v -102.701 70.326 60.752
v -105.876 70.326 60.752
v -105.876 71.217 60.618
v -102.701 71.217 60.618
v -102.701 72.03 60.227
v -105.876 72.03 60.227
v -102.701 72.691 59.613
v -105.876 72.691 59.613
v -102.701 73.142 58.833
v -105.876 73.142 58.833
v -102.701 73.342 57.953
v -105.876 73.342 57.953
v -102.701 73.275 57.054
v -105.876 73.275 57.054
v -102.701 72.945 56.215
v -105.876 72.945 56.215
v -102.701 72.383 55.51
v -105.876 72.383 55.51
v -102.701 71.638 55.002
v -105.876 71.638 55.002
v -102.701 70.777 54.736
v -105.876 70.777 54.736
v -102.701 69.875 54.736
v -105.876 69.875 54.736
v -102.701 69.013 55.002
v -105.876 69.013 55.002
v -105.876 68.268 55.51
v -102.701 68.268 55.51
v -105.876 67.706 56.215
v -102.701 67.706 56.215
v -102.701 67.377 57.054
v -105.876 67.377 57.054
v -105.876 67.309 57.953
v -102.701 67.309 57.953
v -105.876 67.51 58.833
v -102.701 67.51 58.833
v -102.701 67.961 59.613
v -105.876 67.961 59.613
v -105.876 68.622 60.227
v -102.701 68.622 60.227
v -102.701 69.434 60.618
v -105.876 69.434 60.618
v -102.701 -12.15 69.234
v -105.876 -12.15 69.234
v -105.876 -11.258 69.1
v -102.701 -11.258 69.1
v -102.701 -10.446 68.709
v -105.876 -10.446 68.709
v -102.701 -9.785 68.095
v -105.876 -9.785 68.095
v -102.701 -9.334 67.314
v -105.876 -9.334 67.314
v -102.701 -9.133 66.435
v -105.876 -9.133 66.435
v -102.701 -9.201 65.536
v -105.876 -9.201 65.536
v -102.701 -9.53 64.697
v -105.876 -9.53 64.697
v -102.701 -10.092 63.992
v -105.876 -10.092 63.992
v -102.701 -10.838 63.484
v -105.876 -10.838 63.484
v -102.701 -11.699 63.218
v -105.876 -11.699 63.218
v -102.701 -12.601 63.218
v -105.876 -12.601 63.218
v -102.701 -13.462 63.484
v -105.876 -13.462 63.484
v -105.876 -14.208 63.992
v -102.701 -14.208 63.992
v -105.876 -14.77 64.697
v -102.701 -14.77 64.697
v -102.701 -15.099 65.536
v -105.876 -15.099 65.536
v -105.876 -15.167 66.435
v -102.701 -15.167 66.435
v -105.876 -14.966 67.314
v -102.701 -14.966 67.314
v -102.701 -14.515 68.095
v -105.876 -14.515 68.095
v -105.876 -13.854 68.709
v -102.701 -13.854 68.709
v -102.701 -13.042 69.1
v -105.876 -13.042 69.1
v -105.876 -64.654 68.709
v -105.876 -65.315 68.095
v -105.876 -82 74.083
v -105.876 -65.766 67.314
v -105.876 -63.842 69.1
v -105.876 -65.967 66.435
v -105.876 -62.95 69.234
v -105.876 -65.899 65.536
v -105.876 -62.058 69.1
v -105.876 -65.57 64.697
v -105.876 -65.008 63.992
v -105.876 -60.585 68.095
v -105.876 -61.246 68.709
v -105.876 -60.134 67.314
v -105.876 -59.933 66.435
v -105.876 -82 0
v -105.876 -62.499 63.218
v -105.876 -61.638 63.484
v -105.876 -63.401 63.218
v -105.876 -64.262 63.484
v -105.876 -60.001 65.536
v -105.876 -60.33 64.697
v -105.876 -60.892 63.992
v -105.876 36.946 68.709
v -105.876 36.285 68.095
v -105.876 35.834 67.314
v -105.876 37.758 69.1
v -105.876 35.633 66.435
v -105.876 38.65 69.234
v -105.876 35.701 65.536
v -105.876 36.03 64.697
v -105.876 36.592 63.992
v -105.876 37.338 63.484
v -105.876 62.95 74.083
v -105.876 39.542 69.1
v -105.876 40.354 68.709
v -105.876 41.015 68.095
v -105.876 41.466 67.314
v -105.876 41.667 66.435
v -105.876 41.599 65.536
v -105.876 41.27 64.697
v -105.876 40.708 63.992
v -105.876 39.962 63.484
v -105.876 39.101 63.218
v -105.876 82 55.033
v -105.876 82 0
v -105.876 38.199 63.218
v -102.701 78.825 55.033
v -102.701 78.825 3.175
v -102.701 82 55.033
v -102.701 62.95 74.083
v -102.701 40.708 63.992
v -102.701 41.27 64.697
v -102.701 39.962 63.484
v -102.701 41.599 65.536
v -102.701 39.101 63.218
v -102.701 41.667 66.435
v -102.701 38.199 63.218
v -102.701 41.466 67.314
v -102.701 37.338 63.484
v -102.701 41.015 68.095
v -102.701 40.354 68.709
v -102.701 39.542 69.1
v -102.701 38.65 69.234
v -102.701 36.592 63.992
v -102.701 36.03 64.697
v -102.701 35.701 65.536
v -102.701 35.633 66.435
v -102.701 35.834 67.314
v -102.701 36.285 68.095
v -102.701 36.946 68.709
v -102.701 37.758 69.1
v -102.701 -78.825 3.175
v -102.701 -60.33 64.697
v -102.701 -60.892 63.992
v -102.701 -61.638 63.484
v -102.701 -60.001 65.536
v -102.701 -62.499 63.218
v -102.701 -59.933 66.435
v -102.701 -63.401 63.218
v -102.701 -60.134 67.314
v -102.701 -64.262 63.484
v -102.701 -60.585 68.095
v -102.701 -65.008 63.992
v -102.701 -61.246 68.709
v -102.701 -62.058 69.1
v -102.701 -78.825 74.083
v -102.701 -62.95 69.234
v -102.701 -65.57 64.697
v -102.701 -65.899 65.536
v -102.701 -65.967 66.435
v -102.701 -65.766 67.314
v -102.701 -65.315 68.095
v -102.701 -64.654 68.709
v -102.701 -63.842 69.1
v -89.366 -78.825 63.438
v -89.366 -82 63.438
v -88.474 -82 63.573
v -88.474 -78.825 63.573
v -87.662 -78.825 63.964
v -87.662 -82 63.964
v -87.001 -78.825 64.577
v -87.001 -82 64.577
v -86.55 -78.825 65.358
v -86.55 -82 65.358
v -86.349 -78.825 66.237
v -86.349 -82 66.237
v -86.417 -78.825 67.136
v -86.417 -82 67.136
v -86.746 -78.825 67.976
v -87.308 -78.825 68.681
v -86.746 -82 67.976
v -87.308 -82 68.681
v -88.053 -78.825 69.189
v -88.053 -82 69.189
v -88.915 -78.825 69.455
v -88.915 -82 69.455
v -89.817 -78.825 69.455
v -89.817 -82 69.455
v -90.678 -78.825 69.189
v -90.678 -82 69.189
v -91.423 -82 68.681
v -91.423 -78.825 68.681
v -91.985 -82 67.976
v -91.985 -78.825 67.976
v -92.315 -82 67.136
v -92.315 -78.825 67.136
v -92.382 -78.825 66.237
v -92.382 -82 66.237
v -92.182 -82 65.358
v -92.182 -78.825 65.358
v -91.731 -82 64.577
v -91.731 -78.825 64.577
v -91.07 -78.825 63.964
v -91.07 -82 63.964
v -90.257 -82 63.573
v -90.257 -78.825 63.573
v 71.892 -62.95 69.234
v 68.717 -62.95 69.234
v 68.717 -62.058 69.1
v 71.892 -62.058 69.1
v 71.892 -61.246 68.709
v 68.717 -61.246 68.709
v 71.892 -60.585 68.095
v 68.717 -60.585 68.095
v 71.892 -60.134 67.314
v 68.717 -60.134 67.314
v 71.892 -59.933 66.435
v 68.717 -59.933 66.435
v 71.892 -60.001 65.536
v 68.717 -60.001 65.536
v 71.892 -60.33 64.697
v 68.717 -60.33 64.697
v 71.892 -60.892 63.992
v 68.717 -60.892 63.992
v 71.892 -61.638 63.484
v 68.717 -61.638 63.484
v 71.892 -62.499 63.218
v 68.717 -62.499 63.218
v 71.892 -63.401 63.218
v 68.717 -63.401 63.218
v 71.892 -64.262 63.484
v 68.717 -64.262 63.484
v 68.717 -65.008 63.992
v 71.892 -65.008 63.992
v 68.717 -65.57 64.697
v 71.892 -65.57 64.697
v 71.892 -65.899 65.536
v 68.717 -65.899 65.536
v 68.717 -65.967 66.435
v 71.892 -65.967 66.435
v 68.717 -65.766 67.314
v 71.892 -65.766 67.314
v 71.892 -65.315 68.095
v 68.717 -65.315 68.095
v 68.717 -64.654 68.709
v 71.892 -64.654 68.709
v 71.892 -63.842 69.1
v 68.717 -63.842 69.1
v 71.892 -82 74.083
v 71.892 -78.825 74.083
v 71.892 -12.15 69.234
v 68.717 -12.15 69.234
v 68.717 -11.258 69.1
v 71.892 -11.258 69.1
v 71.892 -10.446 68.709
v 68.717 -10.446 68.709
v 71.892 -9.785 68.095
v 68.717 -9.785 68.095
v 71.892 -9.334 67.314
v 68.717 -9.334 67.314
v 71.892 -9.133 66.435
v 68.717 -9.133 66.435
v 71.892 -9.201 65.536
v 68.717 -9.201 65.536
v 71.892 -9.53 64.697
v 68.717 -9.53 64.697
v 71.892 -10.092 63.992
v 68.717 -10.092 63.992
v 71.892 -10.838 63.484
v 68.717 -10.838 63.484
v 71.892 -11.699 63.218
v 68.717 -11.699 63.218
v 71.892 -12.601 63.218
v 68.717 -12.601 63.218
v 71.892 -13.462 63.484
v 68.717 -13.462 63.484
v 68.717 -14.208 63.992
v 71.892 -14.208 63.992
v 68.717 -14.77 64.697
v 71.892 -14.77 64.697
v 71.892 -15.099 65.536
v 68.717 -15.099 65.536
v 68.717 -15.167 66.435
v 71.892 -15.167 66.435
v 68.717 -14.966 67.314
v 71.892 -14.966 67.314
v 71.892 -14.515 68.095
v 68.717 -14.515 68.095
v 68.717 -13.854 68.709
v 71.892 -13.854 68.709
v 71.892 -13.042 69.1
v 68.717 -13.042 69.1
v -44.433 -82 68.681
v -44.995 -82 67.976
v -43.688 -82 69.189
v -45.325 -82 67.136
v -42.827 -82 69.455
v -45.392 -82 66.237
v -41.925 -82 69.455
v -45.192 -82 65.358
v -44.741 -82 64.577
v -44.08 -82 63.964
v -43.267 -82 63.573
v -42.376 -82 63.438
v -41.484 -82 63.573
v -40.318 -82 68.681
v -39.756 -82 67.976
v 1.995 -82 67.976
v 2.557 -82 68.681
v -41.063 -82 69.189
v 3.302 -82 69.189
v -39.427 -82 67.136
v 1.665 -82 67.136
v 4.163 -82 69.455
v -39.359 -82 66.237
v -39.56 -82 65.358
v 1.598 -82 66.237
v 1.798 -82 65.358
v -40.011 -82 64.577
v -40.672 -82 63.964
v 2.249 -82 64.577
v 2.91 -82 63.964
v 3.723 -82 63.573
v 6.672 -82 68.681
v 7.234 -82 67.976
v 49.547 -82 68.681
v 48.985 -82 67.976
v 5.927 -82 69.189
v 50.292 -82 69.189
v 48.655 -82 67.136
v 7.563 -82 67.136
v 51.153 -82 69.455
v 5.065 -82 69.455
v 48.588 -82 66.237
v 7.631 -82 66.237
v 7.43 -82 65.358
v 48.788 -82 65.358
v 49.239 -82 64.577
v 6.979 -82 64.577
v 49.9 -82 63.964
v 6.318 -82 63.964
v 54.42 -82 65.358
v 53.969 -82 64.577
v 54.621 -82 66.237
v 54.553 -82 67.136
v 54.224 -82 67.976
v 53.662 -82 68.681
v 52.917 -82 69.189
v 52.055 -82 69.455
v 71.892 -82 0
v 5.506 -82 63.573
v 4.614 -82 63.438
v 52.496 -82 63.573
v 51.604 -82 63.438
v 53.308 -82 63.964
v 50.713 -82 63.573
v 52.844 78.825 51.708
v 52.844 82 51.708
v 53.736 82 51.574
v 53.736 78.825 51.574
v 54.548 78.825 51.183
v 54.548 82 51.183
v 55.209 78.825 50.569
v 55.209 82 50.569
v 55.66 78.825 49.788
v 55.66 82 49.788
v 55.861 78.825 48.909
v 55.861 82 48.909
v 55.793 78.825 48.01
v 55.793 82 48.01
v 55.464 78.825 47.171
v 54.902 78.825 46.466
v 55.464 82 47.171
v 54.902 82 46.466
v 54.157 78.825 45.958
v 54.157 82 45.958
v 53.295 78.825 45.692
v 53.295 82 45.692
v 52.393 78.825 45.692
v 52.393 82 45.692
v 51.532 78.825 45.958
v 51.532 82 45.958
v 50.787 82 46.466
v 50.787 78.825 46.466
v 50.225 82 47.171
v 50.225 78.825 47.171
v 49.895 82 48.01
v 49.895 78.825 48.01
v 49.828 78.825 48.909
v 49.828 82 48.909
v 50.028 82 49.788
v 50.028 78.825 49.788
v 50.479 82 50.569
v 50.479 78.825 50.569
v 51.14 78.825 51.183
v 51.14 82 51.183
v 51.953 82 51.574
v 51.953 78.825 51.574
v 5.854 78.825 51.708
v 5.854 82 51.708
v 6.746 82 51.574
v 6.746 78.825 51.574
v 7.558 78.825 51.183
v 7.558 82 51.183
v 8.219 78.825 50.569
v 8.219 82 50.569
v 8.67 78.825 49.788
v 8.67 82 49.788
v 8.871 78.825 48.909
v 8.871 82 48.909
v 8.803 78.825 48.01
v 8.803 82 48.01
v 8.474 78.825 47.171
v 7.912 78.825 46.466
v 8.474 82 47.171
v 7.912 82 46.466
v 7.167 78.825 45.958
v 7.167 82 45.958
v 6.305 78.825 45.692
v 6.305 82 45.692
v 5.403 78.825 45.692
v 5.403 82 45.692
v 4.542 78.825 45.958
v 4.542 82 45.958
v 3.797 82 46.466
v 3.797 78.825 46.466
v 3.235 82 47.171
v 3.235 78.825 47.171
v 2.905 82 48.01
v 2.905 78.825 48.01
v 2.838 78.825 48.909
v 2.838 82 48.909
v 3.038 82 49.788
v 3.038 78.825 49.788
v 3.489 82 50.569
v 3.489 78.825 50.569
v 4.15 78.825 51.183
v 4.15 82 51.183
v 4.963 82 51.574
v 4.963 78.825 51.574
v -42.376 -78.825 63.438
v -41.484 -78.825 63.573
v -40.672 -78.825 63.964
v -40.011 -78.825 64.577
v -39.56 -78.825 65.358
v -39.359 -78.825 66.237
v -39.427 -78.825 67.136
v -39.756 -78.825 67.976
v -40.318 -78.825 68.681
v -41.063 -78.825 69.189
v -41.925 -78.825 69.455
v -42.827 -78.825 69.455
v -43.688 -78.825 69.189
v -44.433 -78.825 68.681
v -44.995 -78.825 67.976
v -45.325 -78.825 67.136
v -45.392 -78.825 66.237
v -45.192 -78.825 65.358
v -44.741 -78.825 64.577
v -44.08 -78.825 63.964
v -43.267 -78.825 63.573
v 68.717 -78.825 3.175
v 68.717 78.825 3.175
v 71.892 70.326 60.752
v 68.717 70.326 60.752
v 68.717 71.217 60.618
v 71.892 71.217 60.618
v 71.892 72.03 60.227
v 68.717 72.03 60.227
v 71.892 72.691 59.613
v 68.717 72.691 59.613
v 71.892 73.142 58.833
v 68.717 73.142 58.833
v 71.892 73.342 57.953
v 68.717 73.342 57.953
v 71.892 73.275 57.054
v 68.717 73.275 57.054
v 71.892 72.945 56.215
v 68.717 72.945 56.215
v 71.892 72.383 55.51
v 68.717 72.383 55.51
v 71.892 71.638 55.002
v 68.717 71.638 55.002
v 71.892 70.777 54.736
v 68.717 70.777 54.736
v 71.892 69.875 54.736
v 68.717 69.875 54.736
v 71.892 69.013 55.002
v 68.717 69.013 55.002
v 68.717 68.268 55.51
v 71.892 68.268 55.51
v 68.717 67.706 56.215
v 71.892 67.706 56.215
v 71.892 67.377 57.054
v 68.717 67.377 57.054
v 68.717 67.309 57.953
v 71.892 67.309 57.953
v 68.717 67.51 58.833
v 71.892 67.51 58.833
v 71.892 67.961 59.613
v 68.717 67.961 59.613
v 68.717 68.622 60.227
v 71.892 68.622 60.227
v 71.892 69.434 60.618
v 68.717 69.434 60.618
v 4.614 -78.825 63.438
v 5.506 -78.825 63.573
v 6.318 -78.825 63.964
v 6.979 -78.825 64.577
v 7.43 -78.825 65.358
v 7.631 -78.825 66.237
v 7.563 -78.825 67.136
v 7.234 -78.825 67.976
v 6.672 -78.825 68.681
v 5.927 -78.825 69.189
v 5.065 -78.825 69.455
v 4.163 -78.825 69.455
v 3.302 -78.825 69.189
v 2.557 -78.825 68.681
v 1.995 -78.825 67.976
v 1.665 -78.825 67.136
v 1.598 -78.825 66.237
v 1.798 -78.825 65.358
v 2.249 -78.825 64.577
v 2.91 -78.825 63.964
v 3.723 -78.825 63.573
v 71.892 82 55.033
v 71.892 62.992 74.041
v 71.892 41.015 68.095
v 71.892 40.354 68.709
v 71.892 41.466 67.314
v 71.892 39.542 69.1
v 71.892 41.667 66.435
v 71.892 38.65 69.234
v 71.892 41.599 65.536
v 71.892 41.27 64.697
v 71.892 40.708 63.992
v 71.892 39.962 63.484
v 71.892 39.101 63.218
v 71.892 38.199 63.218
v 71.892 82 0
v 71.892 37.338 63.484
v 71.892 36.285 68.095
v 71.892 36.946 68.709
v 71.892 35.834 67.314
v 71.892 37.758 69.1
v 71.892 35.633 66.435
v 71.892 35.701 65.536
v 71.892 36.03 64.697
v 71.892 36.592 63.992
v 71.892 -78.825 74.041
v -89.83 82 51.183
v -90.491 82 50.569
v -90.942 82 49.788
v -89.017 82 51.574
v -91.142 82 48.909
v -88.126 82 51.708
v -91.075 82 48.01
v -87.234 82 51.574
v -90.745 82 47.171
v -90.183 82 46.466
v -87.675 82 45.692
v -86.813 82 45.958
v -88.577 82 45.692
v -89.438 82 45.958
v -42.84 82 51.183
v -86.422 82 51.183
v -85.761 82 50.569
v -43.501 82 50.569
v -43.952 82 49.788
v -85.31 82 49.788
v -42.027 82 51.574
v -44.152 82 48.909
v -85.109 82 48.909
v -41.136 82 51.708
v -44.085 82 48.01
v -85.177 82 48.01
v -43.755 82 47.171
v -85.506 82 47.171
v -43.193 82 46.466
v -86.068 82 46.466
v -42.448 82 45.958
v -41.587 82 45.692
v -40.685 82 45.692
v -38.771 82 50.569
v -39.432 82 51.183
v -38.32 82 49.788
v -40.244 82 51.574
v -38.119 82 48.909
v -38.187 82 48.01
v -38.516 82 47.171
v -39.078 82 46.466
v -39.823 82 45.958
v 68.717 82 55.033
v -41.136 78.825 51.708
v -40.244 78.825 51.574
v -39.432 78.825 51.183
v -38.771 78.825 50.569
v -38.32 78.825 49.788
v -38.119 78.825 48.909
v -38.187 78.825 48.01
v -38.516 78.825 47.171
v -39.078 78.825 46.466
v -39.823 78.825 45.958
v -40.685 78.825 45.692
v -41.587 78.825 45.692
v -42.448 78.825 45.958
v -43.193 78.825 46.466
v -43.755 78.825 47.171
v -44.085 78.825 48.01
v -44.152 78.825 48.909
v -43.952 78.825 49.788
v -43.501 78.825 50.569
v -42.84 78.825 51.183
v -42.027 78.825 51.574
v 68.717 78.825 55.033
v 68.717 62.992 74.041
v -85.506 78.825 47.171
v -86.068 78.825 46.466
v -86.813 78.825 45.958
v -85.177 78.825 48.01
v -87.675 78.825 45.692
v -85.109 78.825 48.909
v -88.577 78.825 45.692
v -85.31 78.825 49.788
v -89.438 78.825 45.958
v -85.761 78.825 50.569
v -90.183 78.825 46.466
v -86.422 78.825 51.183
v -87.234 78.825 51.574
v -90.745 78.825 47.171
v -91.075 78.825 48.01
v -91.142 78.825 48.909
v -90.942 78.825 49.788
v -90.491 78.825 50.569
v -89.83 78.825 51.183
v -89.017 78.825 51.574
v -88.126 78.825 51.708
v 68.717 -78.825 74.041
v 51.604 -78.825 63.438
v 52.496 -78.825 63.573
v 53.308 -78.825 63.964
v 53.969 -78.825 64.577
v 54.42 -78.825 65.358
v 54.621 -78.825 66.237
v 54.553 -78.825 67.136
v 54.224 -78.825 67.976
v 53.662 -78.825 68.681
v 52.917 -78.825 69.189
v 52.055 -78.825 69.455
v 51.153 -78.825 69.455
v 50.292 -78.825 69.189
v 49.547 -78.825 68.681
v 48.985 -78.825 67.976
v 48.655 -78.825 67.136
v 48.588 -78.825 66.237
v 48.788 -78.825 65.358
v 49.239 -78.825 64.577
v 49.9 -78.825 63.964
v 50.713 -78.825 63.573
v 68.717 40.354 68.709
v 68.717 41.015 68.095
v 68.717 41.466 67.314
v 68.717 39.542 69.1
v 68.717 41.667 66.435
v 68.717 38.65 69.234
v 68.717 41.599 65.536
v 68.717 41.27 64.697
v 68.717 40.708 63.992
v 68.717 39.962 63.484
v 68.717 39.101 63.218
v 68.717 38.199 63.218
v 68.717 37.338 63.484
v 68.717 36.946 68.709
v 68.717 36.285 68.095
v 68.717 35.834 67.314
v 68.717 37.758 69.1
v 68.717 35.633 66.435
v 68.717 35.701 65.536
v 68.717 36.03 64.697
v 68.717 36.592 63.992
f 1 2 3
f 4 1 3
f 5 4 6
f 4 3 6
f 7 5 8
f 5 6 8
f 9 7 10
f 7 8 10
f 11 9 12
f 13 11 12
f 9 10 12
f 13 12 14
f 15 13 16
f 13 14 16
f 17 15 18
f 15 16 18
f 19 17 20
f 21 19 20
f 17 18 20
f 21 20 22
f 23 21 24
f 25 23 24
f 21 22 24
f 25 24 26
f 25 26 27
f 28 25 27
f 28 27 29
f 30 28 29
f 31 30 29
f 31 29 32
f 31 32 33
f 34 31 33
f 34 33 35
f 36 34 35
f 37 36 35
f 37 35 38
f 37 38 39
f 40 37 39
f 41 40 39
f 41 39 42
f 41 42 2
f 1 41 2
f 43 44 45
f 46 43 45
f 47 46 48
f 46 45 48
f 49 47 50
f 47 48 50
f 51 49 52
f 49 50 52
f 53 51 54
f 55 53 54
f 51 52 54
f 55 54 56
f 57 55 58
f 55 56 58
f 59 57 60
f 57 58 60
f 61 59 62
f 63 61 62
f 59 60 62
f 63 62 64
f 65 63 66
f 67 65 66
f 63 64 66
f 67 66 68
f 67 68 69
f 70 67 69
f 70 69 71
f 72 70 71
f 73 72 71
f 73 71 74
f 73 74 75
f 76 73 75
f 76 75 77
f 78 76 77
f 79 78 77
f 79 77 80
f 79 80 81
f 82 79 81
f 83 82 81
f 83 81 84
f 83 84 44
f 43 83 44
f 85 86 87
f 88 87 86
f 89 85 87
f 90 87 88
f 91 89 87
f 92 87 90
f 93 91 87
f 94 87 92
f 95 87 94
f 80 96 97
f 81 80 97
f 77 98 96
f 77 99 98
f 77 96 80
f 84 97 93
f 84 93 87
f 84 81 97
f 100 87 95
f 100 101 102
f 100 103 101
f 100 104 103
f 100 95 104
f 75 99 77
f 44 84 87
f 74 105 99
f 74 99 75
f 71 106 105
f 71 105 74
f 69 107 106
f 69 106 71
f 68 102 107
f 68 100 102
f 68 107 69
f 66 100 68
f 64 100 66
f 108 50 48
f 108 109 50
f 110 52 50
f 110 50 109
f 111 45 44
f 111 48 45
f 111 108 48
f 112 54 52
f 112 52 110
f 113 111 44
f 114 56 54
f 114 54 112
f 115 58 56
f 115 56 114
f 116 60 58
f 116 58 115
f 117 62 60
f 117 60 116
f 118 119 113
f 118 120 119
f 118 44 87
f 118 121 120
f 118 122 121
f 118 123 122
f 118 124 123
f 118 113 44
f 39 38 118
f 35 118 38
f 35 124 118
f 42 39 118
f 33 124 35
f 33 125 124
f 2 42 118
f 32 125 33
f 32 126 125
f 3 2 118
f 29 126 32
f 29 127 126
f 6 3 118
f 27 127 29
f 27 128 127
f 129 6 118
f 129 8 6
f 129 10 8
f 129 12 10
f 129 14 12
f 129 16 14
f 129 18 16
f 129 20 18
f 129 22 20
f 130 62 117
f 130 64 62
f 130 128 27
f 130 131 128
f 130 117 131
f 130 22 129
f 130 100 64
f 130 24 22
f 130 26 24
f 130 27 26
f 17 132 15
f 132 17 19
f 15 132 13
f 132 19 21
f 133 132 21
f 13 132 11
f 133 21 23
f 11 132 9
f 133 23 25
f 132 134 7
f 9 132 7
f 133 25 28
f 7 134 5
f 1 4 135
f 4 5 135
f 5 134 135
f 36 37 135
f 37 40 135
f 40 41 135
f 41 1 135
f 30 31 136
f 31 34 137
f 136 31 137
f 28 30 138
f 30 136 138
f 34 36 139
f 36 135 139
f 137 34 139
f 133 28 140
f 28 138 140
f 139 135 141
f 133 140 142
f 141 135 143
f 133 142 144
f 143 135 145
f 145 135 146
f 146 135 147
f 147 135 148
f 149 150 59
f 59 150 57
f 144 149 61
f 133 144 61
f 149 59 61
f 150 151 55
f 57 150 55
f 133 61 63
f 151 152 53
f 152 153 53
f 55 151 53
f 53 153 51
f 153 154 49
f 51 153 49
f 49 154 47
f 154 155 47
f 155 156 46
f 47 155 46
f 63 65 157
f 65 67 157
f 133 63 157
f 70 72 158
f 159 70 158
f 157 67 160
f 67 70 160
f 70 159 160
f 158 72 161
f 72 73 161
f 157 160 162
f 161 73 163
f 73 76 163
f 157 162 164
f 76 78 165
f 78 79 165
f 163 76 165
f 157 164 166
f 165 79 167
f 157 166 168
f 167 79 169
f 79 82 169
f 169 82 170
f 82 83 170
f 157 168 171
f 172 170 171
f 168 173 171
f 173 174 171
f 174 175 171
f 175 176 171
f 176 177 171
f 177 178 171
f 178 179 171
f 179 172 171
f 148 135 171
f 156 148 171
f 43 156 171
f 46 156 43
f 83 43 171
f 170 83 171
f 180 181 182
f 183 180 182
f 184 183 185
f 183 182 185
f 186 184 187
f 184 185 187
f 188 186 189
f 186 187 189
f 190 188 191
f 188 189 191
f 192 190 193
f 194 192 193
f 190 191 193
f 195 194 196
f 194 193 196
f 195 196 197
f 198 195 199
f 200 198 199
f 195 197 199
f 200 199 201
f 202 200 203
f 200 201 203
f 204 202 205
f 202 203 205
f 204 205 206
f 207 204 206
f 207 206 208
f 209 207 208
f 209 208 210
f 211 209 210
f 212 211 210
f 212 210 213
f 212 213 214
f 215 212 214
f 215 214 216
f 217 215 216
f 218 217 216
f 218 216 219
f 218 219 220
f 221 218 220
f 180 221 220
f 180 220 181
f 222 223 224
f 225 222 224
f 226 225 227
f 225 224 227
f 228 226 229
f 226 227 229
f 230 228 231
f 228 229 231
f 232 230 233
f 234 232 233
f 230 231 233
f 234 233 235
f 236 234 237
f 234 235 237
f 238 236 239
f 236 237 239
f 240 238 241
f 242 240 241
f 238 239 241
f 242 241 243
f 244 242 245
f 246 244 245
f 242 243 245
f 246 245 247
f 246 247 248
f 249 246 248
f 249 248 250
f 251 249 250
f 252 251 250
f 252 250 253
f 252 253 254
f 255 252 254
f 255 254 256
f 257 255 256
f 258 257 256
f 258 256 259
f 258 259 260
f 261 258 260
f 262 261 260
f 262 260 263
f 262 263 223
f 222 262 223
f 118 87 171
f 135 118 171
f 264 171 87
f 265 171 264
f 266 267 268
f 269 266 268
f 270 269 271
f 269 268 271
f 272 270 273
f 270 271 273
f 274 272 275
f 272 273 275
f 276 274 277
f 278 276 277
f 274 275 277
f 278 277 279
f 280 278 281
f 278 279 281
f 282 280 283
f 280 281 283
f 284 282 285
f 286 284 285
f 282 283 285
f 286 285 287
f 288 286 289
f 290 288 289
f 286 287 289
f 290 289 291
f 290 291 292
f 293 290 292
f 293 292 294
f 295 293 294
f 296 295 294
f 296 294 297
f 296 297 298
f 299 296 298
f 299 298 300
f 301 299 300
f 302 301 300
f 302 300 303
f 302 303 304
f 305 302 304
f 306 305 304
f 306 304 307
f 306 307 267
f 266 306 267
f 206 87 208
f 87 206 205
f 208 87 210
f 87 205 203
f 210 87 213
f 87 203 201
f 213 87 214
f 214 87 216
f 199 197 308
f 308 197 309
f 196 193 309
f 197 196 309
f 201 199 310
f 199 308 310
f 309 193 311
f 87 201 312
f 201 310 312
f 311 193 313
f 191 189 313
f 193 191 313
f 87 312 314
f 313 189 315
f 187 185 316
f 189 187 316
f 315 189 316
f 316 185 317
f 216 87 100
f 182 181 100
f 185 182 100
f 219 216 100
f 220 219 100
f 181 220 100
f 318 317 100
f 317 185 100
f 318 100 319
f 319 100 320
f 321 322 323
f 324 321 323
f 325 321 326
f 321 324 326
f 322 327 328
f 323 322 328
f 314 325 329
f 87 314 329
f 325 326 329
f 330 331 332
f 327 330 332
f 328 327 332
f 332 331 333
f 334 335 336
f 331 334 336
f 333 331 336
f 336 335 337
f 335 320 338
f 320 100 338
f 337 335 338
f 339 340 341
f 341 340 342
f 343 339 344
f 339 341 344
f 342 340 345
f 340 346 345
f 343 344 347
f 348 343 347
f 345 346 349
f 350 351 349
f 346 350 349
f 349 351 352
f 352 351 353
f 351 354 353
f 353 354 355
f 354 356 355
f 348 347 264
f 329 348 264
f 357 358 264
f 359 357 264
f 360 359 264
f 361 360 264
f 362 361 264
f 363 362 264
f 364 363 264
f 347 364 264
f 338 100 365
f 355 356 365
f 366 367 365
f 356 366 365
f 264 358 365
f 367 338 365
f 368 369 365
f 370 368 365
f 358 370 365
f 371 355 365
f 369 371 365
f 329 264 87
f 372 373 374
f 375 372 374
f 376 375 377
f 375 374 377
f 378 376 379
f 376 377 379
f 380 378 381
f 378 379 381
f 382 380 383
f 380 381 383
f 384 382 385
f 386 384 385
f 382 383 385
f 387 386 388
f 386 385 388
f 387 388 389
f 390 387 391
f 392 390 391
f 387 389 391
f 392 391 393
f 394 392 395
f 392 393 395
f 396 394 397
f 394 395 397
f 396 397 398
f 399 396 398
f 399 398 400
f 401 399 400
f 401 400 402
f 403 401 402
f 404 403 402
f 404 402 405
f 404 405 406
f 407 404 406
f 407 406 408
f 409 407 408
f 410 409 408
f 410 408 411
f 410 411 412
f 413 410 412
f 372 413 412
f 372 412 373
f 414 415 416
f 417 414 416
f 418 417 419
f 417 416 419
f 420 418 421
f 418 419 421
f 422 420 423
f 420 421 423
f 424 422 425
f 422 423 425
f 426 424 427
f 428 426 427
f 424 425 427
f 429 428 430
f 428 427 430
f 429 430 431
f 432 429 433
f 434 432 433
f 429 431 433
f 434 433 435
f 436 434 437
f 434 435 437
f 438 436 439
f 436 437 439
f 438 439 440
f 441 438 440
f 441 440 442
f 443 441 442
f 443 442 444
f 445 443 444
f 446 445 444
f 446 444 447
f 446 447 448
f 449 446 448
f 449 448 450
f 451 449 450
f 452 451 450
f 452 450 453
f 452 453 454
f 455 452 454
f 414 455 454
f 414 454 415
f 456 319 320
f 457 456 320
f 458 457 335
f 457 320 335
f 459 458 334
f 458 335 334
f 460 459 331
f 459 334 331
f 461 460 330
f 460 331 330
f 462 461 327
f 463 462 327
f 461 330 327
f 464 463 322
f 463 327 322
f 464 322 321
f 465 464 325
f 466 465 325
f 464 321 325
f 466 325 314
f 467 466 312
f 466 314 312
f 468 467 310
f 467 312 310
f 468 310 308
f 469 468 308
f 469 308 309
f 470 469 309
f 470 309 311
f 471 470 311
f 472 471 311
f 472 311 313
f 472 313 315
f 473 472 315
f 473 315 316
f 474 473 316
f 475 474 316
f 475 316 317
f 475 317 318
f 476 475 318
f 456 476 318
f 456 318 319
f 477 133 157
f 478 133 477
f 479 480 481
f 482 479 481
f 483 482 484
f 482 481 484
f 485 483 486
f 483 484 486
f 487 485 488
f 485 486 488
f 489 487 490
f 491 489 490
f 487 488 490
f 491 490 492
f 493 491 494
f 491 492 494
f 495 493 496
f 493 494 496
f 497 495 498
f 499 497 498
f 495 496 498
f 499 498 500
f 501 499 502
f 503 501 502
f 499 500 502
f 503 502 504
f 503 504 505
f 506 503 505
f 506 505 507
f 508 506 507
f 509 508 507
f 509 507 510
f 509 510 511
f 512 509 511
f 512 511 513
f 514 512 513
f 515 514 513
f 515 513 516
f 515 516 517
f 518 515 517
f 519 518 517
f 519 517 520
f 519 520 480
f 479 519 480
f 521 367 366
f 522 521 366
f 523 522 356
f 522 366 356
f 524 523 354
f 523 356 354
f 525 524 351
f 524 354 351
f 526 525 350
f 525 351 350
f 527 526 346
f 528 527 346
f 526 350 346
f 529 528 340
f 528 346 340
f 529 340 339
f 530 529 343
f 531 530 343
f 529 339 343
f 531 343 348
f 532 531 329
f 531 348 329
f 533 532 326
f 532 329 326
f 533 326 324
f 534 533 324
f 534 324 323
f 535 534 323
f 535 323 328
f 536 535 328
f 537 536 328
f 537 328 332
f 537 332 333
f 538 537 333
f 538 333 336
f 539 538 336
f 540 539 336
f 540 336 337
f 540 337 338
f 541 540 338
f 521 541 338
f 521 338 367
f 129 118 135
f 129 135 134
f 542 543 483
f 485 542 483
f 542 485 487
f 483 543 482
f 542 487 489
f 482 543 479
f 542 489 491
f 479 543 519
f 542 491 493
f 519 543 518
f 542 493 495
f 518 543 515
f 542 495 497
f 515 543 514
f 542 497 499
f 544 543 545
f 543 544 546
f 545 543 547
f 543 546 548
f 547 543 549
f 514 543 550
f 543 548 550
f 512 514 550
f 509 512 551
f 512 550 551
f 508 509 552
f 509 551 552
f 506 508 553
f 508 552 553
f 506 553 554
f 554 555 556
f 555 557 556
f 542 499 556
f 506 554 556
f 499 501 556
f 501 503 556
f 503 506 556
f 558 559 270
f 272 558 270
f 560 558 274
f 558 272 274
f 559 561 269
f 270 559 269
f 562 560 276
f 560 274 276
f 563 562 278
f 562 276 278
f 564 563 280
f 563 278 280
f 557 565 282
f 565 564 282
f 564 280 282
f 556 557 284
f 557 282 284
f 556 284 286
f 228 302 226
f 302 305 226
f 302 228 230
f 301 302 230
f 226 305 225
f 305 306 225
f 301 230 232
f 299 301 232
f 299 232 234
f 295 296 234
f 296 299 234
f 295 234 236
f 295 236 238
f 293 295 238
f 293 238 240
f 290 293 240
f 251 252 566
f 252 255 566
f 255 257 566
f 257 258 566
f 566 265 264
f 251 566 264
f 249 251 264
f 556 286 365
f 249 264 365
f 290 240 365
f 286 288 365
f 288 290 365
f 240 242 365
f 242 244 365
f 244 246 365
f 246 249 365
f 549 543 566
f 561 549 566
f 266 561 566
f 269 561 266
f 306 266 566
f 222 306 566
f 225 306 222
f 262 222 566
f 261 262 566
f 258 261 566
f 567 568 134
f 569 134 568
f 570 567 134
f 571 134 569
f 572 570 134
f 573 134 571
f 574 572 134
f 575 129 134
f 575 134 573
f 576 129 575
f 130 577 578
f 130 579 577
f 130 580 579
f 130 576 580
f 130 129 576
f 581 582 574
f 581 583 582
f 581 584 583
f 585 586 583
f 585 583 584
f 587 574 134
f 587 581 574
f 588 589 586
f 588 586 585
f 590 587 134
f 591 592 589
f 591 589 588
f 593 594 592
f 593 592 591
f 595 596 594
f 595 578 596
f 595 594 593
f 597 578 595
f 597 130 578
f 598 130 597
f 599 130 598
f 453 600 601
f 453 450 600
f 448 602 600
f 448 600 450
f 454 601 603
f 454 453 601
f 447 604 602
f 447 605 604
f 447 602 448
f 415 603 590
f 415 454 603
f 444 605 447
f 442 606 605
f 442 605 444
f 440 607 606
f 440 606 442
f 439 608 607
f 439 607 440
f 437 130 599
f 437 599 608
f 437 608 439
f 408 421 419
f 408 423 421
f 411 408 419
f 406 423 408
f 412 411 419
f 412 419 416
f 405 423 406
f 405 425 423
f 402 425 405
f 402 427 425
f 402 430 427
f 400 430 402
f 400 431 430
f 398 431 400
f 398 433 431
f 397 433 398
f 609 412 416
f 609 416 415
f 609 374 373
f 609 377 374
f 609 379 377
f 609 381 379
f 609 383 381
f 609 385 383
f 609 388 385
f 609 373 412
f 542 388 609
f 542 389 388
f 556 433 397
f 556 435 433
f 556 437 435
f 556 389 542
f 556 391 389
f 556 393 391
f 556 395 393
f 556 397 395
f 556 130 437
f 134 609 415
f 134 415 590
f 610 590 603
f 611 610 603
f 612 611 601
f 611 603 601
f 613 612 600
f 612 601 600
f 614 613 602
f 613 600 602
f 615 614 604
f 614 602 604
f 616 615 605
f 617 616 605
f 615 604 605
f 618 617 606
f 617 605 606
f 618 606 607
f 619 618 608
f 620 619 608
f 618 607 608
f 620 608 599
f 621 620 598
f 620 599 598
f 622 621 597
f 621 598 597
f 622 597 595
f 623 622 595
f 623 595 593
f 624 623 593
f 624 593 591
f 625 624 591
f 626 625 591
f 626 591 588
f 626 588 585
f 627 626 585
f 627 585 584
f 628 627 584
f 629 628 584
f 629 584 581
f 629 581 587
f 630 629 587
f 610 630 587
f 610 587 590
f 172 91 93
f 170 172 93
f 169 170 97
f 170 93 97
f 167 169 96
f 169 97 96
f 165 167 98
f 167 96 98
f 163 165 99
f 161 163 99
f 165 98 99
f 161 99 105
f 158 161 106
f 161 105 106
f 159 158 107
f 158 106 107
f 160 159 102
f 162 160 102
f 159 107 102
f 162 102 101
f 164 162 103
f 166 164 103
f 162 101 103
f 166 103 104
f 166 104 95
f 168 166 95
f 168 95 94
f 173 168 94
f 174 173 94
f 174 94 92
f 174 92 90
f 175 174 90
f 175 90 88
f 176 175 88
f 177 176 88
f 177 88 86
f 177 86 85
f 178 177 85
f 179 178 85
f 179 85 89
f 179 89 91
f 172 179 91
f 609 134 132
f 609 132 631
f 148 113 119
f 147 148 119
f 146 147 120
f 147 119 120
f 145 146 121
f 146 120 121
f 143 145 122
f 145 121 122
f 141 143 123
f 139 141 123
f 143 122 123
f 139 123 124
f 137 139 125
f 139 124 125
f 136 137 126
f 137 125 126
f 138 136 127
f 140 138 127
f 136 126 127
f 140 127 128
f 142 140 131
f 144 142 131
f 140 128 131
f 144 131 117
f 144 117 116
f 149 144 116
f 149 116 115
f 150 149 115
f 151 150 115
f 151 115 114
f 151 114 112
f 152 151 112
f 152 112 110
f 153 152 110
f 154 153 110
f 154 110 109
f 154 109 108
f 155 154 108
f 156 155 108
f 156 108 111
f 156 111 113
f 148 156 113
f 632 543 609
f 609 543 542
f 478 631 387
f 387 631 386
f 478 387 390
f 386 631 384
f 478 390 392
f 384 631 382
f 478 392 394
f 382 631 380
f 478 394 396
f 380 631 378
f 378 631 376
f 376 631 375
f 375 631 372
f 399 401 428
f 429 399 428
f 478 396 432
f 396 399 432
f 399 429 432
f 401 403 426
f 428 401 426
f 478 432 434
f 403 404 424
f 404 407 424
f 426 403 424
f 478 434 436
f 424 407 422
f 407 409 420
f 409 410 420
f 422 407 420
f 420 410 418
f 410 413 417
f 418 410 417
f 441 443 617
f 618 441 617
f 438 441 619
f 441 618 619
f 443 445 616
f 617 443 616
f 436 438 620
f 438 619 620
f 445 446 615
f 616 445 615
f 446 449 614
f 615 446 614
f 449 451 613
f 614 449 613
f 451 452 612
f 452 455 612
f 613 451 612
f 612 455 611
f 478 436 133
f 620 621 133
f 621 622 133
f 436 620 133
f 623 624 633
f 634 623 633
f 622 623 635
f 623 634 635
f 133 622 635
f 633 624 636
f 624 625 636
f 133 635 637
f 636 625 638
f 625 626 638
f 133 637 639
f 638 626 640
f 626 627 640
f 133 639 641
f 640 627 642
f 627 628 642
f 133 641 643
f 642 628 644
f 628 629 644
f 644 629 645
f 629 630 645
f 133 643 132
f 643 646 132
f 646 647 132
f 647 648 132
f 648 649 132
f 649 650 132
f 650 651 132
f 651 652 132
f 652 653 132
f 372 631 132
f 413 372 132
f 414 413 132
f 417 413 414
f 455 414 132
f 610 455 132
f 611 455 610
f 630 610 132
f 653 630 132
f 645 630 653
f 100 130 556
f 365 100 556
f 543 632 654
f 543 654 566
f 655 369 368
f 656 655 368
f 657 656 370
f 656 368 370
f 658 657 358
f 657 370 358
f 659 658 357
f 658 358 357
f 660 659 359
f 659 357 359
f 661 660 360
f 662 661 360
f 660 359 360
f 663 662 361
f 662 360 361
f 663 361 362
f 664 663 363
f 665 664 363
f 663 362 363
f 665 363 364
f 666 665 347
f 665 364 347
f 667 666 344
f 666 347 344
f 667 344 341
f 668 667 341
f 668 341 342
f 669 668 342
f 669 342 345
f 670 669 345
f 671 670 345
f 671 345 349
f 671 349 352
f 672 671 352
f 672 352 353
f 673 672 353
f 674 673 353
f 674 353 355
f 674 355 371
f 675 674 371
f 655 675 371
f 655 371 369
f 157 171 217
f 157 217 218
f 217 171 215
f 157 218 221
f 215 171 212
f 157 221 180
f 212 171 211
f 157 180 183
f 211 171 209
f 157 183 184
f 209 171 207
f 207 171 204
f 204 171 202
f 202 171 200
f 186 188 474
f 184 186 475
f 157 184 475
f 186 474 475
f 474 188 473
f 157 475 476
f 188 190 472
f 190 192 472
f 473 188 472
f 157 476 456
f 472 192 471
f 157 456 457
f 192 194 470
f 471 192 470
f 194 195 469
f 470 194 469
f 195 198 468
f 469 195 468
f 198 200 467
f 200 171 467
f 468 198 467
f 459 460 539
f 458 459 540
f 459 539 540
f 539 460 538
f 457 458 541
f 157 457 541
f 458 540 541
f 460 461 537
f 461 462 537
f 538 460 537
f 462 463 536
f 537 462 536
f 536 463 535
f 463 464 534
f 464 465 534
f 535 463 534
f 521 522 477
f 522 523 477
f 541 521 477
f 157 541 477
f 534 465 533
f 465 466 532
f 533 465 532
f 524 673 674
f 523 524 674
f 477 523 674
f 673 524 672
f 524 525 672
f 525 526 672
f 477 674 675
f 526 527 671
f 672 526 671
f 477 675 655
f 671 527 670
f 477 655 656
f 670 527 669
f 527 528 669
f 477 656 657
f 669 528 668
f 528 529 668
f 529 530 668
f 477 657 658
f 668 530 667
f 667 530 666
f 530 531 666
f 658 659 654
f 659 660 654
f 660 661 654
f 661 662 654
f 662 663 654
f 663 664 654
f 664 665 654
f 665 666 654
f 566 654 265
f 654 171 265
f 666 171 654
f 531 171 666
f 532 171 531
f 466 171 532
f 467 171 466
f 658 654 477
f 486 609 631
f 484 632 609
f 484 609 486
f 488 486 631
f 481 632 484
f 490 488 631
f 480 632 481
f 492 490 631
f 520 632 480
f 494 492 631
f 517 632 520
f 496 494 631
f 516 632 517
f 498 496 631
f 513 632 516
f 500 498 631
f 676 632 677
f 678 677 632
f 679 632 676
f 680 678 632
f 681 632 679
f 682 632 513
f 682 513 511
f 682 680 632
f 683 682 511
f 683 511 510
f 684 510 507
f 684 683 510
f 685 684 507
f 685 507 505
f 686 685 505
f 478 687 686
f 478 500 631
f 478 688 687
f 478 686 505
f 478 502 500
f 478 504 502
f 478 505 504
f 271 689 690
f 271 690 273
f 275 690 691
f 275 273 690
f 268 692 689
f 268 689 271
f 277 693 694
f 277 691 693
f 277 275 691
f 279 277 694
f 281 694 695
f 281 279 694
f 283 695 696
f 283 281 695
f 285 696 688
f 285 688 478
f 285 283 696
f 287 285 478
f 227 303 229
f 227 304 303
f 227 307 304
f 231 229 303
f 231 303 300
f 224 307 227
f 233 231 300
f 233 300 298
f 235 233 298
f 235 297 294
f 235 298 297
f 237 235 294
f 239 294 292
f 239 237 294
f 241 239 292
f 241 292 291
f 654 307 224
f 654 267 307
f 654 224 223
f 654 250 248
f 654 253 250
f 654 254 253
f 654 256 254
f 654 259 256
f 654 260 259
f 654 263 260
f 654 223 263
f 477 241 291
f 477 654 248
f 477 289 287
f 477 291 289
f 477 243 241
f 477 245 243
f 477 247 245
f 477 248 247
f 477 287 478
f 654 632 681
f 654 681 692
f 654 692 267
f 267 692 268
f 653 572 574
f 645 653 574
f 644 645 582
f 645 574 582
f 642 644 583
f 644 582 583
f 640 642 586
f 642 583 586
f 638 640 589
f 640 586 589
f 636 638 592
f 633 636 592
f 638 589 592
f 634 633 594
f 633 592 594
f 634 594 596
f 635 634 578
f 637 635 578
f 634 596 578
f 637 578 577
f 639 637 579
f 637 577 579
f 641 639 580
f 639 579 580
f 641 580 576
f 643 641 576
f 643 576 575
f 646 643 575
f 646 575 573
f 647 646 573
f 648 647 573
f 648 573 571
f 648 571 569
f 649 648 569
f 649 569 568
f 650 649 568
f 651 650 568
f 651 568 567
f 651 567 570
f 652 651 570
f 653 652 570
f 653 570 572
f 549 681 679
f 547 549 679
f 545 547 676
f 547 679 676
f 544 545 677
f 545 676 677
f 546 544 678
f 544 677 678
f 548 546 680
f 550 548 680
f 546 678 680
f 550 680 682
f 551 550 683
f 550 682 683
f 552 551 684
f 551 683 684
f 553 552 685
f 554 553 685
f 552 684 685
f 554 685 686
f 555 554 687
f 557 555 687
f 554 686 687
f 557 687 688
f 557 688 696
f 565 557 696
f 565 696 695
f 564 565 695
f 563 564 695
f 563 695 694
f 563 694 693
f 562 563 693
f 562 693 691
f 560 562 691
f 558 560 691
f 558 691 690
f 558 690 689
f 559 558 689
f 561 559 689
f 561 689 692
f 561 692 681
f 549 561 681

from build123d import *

# Parameters (mm, degrees)
SKETCH2_W                = 211.751333334
SKETCH2_H                = 164
BOSS_EXTRUDE1_DEPTH      = 74.083333333
CUT_EXTRUDE7_DEPTH       = 70.90833333
CUT_EXTRUDE9_REACH       = 240.853
CUT_EXTRUDE10_DEPTH      = 3.175
SKETCH14_W               = 205.401333334
SKETCH14_H               = 3.175
CUT_EXTRUDE11_DEPTH      = 3.175
CUT_EXTRUDE12_DEPTH      = 239.853443446
CUT_EXTRUDE12_DEPTH_BACK = 3.175
CUT_EXTRUDE14_REACH      = 210.792
SKETCH18_R               = 3.025
LPATTERN2_COUNT          = 4
LPATTERN2_PITCH          = 46.99
CUT_EXTRUDE15_REACH      = 210.792
SKETCH19_R               = 3.025
LPATTERN3_COUNT          = 4
LPATTERN3_PITCH          = 46.99
BOSS_EXTRUDE2_DEPTH      = 70.866
SKETCH25_W               = 3.175
SKETCH25_H               = 19.00766667
BOSS_EXTRUDE3_DEPTH      = 3.175
CUT_EXTRUDE18_REACH      = 211.317
CUT_EXTRUDE19_REACH      = 155.042
SKETCH16_R               = 3.025
CUT_EXTRUDE20_DEPTH      = 210.317467246
LPATTERN4_COUNT          = 3
LPATTERN4_PITCH          = 50.8
SKETCH20_R               = 3.025
CUT_EXTRUDE21_DEPTH      = 210.317467246


with BuildPart() as part:
    # Sketch2 → Boss-Extrude1 (new body)
    with BuildSketch(Plane.XY):
        Rectangle(SKETCH2_W, SKETCH2_H)
    extrude(amount=BOSS_EXTRUDE1_DEPTH)

    # Sketch9 → Cut-Extrude7 (cut)
    with BuildSketch(Plane.XY.offset(74.083333333)):
        Polygon((-102.700666667, 62.95), (-102.700666667, -47.748173381), (-102.700666667, -78.825), (-61.266487403, -78.825), (102.700666667, -78.825), (102.700666667, -21.962957065), (102.700666667, 78.825), (-87.76182231, 78.825), (-102.700666667, 78.825), align=None)
    extrude(amount=-CUT_EXTRUDE7_DEPTH, mode=Mode.SUBTRACT)

    # Sketch11 → Cut-Extrude9 (cut, up to next)
    with BuildSketch(Plane.ZY.offset(105.875666667), mode=Mode.PRIVATE) as cut_extrude9_sk1:
        Polygon((58.208333333, 78.825), (74.083333333, 62.95), (74.083333333, 82), (58.208333333, 82), (58.208333333, 79.62382388), align=None)
    cut_extrude9_tool1 = extrude(cut_extrude9_sk1.sketch, amount=-CUT_EXTRUDE9_REACH, mode=Mode.PRIVATE) & part.part
    add(cut_extrude9_tool1.solids().sort_by_distance((-105.875667, 75.49881, 68.035714))[0], mode=Mode.SUBTRACT)

    # Sketch13 → Cut-Extrude10 (cut)
    with BuildSketch(Plane.ZY.offset(105.875666667)):
        Polygon((58.208333333, 78.825), (55.033333333, 82), (58.208333333, 82), align=None)
    extrude(amount=-CUT_EXTRUDE10_DEPTH, mode=Mode.SUBTRACT)

    # Sketch14 → Cut-Extrude11 (cut)
    with BuildSketch(Plane.XY.offset(58.208333333)):
        with Locations((0, 80.4125)):
            Rectangle(SKETCH14_W, SKETCH14_H)
    extrude(amount=-CUT_EXTRUDE11_DEPTH, mode=Mode.SUBTRACT)

    # Sketch15 → Cut-Extrude12 (cut, two sides: drawn at the far end of the back side and taken through both)
    with BuildSketch(Plane(origin=(105.875666667, 0, 0), x_dir=(0, 0, -1), z_dir=(1, 0, 0)).offset(-CUT_EXTRUDE12_DEPTH_BACK)):
        Polygon((-58.208333333, 79.215720039), (-58.208333333, 78.825), (-55.033333333, 82), (-58.208333333, 82), align=None)
    extrude(amount=CUT_EXTRUDE12_DEPTH + CUT_EXTRUDE12_DEPTH_BACK, mode=Mode.SUBTRACT)

    # Sketch18 → Cut-Extrude14 (cut, up to next)
    with BuildSketch(Plane.XZ.offset(82), mode=Mode.PRIVATE) as cut_extrude14_sk1:
        with Locations(Location((-89.365666667, 66.463333333, 0), (0, 0, 270))):
            Circle(SKETCH18_R)
    cut_extrude14_tool1 = extrude(cut_extrude14_sk1.sketch, amount=-CUT_EXTRUDE14_REACH, mode=Mode.PRIVATE) & part.part
    cut_extrude14 = cut_extrude14_tool1.solids().sort_by_distance((-89.365667, -82, 66.463333))[0]
    add(cut_extrude14, mode=Mode.SUBTRACT)

    # LPattern2: Cut-Extrude14 ×4
    with Locations(*[(i * LPATTERN2_PITCH, 0, 0) for i in range(1, LPATTERN2_COUNT)]):
        add(cut_extrude14, mode=Mode.SUBTRACT)

    # Sketch19 → Cut-Extrude15 (cut, up to next)
    with BuildSketch(Plane(origin=(0, 82, 0), x_dir=(1, 0, 0), z_dir=(0, 1, 0)), mode=Mode.PRIVATE) as cut_extrude15_sk1:
        with Locations(Location((-88.125666667, -48.683333333, 0), (0, 0, 270))):
            Circle(SKETCH19_R)
    cut_extrude15_tool1 = extrude(cut_extrude15_sk1.sketch, amount=-CUT_EXTRUDE15_REACH, mode=Mode.PRIVATE) & part.part
    cut_extrude15 = cut_extrude15_tool1.solids().sort_by_distance((-88.125667, 82, 48.683333))[0]
    add(cut_extrude15, mode=Mode.SUBTRACT)

    # LPattern3: Cut-Extrude15 ×4
    with Locations(*[(i * LPATTERN3_PITCH, 0, 0) for i in range(1, LPATTERN3_COUNT)]):
        add(cut_extrude15, mode=Mode.SUBTRACT)

    # Sketch22 → Boss-Extrude2 (add)
    with BuildSketch(Plane.XY.offset(3.175000003)):
        Polygon((68.717333313, 46.40313661), (68.717333313, 78.825), (71.892333313, 78.825), (71.892333313, -78.825), (68.717333313, -78.825), align=None)
    extrude(amount=BOSS_EXTRUDE2_DEPTH)

    # Sketch25 → Boss-Extrude3 (add)
    with BuildSketch(Plane(origin=(0, 78.825, 0), x_dir=(1, 0, 0), z_dir=(0, 1, 0))):
        with Locations((70.304833313, -64.537166668)):
            Rectangle(SKETCH25_W, SKETCH25_H)
    extrude(amount=BOSS_EXTRUDE3_DEPTH)

    # Sketch26 → Cut-Extrude18 (cut, up to next)
    with BuildSketch(Plane(origin=(71.892333313, 0, 0), x_dir=(0, 0, -1), z_dir=(1, 0, 0)), mode=Mode.PRIVATE) as cut_extrude18_sk1:
        Polygon((-74.083333333, 62.95), (-55.033333333, 82), (-74.041000003, 82), align=None)
    cut_extrude18_tool1 = extrude(cut_extrude18_sk1.sketch, amount=-CUT_EXTRUDE18_REACH, mode=Mode.PRIVATE) & part.part
    add(cut_extrude18_tool1.solids().sort_by_distance((71.892333, 75.65, 67.719222))[0], mode=Mode.SUBTRACT)

    # Sketch27 → Cut-Extrude19 (cut, up to next)
    with BuildSketch(Plane.XY.offset(74.083333333), mode=Mode.PRIVATE) as cut_extrude19_sk1:
        Polygon((71.892333313, -78.825), (71.892333313, -82), (105.875666667, -82), (105.875666667, 82), (71.892333313, 82), align=None)
    cut_extrude19_tool1 = extrude(cut_extrude19_sk1.sketch, amount=-CUT_EXTRUDE19_REACH, mode=Mode.PRIVATE) & part.part
    add(cut_extrude19_tool1.solids().sort_by_distance((88.884, 0, 74.083333))[0], mode=Mode.SUBTRACT)

    # Sketch16 → Cut-Extrude20 (cut, through all)
    with BuildSketch(Plane.ZY.offset(105.875666667)):
        with Locations((66.209333333, -62.95)):
            Circle(SKETCH16_R)
    cut_extrude20 = extrude(amount=-CUT_EXTRUDE20_DEPTH, mode=Mode.SUBTRACT)

    # LPattern4: Cut-Extrude20 ×3
    with Locations(*[(0, i * LPATTERN4_PITCH, 0) for i in range(1, LPATTERN4_COUNT)]):
        add(cut_extrude20, mode=Mode.SUBTRACT)

    # Sketch20 → Cut-Extrude21 (cut, through all)
    with BuildSketch(Plane.ZY.offset(105.875666667)):
        with Locations((57.72741017, 70.325667043)):
            Circle(SKETCH20_R)
    extrude(amount=-CUT_EXTRUDE21_DEPTH, mode=Mode.SUBTRACT)


solid = part.part
